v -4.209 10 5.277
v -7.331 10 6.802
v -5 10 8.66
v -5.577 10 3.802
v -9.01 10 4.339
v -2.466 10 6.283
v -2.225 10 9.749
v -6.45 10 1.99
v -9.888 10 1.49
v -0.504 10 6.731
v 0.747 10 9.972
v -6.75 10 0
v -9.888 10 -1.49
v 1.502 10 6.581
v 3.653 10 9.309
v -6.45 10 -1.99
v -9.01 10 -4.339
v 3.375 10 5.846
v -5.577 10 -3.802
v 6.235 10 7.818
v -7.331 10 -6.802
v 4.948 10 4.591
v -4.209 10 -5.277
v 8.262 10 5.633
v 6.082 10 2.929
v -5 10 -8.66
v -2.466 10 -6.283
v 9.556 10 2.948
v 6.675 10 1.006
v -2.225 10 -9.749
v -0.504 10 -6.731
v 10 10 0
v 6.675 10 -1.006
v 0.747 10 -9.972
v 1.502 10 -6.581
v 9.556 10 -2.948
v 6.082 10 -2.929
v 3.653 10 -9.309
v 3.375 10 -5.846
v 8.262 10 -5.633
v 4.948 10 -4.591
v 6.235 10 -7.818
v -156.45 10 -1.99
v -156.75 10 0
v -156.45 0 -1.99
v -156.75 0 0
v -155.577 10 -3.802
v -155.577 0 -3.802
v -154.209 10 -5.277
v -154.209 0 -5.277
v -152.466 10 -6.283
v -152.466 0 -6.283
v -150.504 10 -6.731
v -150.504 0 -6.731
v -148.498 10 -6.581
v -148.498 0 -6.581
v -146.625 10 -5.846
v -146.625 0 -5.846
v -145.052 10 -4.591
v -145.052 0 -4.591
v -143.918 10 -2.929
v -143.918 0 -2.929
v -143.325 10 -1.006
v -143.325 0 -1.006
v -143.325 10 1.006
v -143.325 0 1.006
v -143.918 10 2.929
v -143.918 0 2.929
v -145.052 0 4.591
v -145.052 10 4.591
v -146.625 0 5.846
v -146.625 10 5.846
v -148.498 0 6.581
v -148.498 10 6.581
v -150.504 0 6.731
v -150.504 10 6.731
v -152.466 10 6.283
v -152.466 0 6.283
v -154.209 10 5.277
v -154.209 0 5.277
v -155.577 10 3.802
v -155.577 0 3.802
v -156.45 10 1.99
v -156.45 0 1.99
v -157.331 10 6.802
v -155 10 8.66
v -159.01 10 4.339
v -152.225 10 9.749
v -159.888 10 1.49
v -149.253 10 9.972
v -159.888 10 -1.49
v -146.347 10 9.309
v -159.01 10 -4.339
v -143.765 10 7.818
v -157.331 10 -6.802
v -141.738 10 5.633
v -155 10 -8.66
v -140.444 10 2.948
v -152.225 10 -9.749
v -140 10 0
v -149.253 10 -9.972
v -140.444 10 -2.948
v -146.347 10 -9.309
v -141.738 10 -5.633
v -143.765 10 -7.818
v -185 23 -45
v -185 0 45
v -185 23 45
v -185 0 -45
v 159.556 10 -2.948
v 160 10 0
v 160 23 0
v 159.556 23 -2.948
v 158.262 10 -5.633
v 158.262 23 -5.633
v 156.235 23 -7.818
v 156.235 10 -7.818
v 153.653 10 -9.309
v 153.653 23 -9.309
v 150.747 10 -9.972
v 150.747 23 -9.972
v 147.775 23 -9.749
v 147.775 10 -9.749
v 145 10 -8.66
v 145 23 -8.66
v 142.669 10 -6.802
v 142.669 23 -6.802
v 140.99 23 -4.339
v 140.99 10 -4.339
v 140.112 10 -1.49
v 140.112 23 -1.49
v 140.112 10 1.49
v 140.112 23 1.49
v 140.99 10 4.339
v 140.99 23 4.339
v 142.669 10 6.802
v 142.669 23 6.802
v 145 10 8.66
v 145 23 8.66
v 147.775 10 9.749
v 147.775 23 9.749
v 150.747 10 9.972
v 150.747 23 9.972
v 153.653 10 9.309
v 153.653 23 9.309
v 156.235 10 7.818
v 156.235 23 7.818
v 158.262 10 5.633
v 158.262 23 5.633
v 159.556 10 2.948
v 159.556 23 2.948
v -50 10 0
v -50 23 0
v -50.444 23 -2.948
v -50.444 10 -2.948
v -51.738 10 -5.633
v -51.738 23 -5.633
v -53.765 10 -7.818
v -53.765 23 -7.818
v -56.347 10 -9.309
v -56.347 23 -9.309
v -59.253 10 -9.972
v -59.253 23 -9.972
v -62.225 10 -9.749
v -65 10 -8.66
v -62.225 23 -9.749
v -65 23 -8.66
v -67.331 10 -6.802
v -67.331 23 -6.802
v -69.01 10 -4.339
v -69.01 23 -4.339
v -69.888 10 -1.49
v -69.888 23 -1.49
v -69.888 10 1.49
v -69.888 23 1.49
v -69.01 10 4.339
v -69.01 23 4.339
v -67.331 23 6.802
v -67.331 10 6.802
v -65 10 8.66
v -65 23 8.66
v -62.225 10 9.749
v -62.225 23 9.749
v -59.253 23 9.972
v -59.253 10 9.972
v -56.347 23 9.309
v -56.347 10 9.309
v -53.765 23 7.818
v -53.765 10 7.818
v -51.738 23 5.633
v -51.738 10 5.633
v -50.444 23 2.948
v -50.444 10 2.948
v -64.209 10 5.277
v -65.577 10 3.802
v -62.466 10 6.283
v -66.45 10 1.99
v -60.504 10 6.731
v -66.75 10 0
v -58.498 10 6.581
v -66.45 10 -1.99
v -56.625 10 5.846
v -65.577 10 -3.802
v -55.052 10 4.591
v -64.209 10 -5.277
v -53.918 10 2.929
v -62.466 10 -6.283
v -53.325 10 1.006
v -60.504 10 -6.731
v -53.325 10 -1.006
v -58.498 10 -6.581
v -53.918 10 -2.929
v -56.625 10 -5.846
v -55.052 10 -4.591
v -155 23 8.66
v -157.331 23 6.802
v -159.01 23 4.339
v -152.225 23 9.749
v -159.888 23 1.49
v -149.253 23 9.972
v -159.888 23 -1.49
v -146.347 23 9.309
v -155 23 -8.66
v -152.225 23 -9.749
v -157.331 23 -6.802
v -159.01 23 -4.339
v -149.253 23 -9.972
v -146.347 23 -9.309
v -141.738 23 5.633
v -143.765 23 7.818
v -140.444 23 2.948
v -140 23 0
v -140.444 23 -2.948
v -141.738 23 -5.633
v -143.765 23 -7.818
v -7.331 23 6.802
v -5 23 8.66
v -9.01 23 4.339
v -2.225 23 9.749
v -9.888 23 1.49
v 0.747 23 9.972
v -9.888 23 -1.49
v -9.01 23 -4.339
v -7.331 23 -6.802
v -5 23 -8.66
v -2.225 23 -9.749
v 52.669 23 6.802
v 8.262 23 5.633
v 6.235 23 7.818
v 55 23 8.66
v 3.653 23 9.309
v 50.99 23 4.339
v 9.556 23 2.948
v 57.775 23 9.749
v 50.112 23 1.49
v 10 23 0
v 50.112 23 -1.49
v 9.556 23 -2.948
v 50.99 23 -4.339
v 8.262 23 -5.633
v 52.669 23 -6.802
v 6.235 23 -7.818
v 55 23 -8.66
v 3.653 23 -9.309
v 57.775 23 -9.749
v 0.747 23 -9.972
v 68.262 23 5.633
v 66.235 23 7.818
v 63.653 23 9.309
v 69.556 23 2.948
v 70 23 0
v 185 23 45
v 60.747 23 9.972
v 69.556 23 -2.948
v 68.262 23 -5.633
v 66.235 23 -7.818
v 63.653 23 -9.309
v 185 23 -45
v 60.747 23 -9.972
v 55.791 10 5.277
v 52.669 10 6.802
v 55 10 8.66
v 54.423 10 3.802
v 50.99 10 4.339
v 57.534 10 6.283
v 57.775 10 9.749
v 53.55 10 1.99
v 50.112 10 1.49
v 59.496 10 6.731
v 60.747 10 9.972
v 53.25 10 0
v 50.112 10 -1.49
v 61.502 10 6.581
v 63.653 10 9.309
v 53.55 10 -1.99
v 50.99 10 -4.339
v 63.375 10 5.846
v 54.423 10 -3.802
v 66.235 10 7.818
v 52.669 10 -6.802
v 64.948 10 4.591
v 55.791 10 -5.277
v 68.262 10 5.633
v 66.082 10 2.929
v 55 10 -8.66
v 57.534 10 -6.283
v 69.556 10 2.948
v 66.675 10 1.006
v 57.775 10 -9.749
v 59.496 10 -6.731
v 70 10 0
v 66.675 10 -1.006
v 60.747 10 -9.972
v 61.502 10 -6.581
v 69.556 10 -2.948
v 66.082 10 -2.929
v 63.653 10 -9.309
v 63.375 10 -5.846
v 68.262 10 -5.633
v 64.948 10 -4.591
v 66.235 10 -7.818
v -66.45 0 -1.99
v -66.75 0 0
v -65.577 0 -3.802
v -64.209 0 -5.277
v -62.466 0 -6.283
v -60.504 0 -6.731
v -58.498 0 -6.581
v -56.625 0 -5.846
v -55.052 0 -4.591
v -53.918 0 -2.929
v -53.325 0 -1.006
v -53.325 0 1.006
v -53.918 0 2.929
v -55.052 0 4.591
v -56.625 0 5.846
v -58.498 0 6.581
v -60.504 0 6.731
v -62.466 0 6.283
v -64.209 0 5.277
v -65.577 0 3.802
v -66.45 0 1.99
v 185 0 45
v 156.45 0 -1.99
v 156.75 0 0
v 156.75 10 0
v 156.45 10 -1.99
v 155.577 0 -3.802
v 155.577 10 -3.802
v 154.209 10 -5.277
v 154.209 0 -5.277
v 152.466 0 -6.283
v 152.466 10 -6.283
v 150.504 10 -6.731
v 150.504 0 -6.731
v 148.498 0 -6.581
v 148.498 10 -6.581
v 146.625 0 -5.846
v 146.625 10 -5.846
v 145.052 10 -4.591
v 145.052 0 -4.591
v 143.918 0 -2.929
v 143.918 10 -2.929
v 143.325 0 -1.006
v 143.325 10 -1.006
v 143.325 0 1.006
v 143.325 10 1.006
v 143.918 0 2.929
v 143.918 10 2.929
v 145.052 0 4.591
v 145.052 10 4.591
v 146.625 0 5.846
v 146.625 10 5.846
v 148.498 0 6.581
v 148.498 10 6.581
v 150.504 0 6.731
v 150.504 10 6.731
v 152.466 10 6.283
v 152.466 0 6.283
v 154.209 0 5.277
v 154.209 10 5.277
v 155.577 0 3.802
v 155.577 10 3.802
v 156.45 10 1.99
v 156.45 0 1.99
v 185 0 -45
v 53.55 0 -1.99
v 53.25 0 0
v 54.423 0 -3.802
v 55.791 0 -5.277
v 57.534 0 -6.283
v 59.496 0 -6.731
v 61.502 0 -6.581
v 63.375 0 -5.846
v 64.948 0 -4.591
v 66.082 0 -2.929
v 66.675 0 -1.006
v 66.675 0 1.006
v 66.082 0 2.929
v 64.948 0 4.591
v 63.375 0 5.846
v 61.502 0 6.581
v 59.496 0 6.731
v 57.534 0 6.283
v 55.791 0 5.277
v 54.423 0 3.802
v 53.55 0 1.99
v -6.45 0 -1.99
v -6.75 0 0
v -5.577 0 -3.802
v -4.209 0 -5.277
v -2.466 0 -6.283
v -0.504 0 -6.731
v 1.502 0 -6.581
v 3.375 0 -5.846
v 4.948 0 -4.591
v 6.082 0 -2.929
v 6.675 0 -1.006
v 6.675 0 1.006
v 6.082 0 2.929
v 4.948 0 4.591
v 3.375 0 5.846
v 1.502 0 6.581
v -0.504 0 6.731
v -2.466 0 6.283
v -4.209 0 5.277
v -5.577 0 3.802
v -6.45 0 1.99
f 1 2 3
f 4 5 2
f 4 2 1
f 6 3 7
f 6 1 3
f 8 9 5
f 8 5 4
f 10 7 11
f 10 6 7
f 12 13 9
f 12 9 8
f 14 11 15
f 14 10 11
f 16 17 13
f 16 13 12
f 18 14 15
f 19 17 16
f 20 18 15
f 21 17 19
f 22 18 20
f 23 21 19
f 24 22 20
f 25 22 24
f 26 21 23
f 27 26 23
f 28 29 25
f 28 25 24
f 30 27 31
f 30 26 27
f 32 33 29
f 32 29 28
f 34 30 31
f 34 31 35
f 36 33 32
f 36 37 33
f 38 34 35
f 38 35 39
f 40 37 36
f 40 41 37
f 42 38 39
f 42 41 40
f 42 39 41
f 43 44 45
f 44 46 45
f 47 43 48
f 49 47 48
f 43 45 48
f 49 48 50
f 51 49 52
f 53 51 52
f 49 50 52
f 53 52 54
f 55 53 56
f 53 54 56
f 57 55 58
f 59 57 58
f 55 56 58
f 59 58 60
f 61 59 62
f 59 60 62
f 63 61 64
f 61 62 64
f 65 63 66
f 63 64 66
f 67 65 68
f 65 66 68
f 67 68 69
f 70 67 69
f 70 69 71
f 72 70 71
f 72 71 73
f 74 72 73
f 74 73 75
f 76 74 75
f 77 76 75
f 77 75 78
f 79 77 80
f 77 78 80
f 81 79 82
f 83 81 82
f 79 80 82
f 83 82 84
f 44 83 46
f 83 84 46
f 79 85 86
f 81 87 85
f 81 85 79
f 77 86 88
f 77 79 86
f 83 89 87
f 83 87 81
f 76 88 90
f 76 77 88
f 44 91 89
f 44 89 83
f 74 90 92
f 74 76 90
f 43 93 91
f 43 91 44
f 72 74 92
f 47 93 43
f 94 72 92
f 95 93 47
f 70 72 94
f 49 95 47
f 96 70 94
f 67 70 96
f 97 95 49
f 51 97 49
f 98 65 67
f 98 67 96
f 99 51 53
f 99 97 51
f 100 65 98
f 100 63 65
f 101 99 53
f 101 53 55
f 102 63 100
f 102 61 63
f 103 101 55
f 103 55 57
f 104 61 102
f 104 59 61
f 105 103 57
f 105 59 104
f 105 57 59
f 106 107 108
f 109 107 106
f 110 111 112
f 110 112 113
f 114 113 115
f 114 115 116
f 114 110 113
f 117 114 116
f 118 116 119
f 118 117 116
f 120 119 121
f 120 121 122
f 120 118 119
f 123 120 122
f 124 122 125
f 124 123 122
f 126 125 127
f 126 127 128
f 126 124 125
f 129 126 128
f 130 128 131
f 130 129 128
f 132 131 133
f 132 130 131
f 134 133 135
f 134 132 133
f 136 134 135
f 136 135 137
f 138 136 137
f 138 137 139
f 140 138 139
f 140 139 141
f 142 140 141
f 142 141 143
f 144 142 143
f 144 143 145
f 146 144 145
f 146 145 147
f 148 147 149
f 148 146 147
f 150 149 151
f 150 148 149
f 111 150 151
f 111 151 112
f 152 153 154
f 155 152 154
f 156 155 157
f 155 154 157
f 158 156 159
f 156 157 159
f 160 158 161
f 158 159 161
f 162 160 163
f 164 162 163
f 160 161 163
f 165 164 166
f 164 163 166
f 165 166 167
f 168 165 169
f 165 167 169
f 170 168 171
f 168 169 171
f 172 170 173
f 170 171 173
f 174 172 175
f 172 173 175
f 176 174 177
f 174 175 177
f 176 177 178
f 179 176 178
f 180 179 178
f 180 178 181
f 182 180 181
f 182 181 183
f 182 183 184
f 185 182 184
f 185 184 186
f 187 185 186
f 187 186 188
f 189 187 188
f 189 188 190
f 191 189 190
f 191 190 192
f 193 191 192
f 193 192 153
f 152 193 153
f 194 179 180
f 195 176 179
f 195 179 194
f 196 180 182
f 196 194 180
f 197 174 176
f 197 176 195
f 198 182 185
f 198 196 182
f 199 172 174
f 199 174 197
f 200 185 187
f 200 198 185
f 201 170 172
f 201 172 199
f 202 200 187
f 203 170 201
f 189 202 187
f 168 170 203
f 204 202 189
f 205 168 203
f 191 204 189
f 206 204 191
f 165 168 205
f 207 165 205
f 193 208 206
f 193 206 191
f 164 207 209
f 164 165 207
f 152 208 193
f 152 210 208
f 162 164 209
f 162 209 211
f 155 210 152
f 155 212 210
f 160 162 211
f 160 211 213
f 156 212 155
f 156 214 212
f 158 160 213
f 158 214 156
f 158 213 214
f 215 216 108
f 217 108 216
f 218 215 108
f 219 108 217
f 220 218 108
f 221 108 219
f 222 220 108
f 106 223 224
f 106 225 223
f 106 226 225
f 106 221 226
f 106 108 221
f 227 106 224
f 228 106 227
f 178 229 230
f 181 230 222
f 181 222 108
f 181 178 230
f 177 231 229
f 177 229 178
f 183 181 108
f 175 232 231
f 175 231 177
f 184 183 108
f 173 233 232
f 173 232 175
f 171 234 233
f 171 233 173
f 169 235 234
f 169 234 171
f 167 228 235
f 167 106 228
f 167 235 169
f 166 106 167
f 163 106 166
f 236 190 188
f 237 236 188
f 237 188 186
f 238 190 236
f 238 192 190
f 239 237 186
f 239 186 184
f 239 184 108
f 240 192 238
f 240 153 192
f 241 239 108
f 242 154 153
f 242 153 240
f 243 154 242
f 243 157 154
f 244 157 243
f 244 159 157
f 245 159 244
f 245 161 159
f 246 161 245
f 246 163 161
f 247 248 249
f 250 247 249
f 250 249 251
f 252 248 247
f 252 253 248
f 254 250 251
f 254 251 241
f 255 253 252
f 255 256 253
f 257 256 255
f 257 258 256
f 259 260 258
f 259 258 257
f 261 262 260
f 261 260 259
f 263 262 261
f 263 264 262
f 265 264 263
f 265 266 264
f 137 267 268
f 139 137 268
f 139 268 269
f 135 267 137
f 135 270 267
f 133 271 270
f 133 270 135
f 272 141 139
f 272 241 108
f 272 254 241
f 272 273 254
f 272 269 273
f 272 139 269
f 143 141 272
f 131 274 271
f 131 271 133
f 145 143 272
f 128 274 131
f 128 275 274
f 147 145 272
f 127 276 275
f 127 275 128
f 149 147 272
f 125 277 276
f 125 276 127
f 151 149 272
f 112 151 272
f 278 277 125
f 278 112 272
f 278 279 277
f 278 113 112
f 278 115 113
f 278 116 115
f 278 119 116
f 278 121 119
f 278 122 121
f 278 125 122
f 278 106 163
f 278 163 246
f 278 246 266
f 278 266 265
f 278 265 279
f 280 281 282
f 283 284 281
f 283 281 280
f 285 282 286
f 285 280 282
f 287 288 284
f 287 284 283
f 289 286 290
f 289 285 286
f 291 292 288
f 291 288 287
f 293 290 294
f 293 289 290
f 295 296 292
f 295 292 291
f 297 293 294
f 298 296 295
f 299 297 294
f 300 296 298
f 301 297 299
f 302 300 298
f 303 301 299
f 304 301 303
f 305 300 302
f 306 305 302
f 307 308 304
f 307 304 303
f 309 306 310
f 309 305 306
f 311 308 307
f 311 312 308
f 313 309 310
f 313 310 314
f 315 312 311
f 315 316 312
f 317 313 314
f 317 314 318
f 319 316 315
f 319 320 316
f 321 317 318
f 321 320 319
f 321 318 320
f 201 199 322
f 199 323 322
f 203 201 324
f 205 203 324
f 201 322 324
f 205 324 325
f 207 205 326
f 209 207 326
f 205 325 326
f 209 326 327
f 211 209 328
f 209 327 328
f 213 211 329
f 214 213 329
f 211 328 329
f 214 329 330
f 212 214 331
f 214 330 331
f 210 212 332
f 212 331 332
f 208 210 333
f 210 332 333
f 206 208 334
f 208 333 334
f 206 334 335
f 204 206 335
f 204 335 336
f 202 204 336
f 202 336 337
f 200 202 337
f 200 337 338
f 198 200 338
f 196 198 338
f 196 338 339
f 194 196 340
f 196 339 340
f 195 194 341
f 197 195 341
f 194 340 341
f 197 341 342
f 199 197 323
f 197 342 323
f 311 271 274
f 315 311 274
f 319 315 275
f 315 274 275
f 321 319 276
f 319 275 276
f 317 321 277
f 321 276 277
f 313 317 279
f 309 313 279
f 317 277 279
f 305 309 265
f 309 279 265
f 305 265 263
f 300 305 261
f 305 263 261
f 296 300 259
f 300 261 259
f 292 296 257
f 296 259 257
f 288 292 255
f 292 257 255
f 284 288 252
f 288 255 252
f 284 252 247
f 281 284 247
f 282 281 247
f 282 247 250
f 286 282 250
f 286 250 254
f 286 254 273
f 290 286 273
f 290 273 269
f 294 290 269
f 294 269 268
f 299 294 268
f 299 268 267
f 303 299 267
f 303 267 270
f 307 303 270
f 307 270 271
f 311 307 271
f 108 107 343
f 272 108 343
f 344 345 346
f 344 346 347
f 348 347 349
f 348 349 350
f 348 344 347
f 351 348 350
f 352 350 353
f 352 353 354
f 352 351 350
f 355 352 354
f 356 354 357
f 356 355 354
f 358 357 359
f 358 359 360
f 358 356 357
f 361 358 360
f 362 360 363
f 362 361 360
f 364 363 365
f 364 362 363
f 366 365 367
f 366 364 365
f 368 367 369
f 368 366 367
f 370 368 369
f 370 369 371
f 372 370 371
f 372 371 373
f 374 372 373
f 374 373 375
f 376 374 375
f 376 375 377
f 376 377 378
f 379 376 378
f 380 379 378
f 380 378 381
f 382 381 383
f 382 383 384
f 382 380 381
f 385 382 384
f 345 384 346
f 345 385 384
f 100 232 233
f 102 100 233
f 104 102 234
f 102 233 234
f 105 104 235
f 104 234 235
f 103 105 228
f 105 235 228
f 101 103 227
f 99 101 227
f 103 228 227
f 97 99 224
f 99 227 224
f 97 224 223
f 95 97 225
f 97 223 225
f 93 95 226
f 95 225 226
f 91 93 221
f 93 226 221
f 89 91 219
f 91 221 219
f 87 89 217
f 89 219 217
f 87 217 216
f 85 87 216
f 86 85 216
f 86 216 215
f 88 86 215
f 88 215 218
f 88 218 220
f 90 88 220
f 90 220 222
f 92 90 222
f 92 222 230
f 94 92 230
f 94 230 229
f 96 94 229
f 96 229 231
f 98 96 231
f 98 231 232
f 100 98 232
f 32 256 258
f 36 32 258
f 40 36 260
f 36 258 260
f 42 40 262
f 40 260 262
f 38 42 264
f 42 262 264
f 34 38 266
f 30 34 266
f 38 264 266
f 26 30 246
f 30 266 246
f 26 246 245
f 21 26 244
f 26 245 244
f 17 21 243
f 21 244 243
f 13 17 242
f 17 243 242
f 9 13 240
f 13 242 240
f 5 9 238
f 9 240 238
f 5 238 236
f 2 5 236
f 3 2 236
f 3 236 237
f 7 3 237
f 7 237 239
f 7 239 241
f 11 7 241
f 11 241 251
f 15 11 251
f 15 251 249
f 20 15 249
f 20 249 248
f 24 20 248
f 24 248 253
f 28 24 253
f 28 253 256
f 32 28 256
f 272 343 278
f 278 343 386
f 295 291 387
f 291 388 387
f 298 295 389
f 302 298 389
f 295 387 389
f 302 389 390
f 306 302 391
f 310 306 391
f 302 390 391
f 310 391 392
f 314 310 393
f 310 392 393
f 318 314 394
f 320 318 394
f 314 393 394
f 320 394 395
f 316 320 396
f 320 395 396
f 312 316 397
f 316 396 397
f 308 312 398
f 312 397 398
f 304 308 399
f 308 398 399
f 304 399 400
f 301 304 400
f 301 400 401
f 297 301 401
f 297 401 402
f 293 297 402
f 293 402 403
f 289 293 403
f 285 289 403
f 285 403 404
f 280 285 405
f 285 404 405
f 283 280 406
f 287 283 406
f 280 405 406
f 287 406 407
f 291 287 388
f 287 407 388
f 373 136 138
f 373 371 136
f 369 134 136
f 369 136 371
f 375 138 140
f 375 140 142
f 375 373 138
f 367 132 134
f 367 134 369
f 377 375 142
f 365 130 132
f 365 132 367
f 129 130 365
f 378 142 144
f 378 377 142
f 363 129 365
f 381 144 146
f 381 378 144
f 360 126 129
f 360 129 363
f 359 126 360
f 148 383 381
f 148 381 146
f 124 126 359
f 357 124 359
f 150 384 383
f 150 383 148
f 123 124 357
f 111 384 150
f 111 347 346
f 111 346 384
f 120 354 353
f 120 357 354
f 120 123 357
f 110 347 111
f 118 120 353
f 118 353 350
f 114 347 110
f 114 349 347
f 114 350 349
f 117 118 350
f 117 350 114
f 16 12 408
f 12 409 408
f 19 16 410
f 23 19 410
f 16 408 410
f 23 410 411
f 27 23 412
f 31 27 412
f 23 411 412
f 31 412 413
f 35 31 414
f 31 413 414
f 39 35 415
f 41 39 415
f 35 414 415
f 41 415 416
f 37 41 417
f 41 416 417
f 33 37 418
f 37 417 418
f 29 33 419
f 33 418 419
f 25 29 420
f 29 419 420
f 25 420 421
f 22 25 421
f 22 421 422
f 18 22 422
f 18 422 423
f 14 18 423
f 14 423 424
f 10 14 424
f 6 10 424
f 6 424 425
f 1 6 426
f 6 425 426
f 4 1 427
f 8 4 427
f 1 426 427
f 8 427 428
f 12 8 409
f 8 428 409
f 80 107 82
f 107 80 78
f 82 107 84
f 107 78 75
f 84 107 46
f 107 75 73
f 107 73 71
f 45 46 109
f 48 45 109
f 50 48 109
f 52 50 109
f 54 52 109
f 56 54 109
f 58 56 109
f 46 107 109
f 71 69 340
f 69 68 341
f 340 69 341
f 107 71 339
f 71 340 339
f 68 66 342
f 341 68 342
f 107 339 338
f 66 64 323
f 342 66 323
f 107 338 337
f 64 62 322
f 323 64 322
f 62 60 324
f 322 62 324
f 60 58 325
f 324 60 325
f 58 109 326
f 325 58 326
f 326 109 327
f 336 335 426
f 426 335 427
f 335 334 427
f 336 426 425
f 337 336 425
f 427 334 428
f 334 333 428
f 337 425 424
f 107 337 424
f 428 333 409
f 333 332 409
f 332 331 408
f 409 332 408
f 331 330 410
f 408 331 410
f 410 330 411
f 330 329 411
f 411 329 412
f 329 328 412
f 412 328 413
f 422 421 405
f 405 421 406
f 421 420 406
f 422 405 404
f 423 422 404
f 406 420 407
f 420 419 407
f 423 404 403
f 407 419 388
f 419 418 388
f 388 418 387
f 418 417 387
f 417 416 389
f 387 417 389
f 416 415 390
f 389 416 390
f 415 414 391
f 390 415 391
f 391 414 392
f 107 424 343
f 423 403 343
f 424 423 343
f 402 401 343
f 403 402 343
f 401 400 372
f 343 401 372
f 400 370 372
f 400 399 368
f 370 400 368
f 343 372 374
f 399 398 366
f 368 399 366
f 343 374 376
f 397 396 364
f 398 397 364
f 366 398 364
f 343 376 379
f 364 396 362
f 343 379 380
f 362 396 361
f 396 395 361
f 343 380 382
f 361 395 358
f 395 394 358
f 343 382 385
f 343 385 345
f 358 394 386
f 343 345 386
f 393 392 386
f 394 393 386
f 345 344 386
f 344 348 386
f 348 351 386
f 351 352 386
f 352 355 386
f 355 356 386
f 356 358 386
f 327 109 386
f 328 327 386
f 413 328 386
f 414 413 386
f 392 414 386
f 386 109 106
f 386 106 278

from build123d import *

# Parameters (mm, degrees)
SKETCH_1_W                          = 370
SKETCH_1_H                          = 90
EXTRUDE_1_DEPTH                     = 23
HOLE_WIZARD_M4_1_D                  = 13.5
HOLE_WIZARD_M4_1_CBORE_D            = 20
HOLE_WIZARD_M4_1_CBORE_DEPTH        = 13
PATTERN_LINEAR_1_COUNT              = 2
PATTERN_LINEAR_1_PITCH              = 90
PATTERN_LINEAR_2_COPY_1_D           = 13.5
PATTERN_LINEAR_2_COPY_1_CBORE_D     = 20
PATTERN_LINEAR_2_COPY_1_CBORE_DEPTH = 13
PATTERN_LINEAR_2_COPY_2_D           = 13.5
PATTERN_LINEAR_2_COPY_2_CBORE_D     = 20
PATTERN_LINEAR_2_COPY_2_CBORE_DEPTH = 13
PATTERN_START                       = 10
PATTERN_LINEAR_3_OUTLINE_R          = 10
PATTERN_LINEAR_3_DEPTH              = 13
PATTERN_LINEAR_3_2_OUTLINE_R        = 6.75
PATTERN_LINEAR_3_2_DEPTH            = 10


# Read off the part's stored shape, not the designer's step: 阵列(线性)3
with BuildPart() as part:
    # 草图1 → 凸台-拉伸1 (new body)
    with BuildSketch(Plane(origin=(0, 0, 0), x_dir=(1, 0, 0), z_dir=(0, 1, 0))):
        Rectangle(SKETCH_1_W, SKETCH_1_H)
    extrude(amount=EXTRUDE_1_DEPTH)

    # M4 六角头螺栓的柱形沉头孔1 (through all)
    with Locations(Plane(origin=(0, 23, 0), x_dir=(1, 0, 0), z_dir=(0, 1, 0))):
        with Locations((-150, 0)):
            hole_wizard_m4_1 = CounterBoreHole(HOLE_WIZARD_M4_1_D / 2, HOLE_WIZARD_M4_1_CBORE_D / 2, HOLE_WIZARD_M4_1_CBORE_DEPTH)

    # 阵列(线性)1: M4 六角头螺栓的柱形沉头孔1 ×2
    with Locations(*[(i * PATTERN_LINEAR_1_PITCH, 0, 0) for i in range(1, PATTERN_LINEAR_1_COUNT)]):
        add(hole_wizard_m4_1, mode=Mode.SUBTRACT)

    # 阵列(线性)2 copy 1 (through all)
    with Locations(Plane(origin=(150, 23, 0), x_dir=(1, 0, 0), z_dir=(0, 1, 0))):
        with Locations((-150, 0)):
            CounterBoreHole(PATTERN_LINEAR_2_COPY_1_D / 2, PATTERN_LINEAR_2_COPY_1_CBORE_D / 2, PATTERN_LINEAR_2_COPY_1_CBORE_DEPTH)

    # 阵列(线性)2 copy 2 (through all)
    with Locations(Plane(origin=(210, 23, 0), x_dir=(1, 0, 0), z_dir=(0, 1, 0))):
        with Locations((-150, 0)):
            CounterBoreHole(PATTERN_LINEAR_2_COPY_2_D / 2, PATTERN_LINEAR_2_COPY_2_CBORE_D / 2, PATTERN_LINEAR_2_COPY_2_CBORE_DEPTH)

    # 阵列(线性)3 outline → 阵列(线性)3 (cut)
    with BuildSketch(Plane(origin=(0, 0, 0), x_dir=(1, 0, 0), z_dir=(0, 1, 0)).offset(PATTERN_START)):
        with Locations((150, 0)):
            Circle(PATTERN_LINEAR_3_OUTLINE_R)
    extrude(amount=PATTERN_LINEAR_3_DEPTH, mode=Mode.SUBTRACT)

    # Pattern Linear 3 2 outline → Pattern Linear 3 2 (cut)
    with BuildSketch(Plane(origin=(0, 0, 0), x_dir=(1, 0, 0), z_dir=(0, 1, 0))):
        with Locations((150, 0)):
            Circle(PATTERN_LINEAR_3_2_OUTLINE_R)
    extrude(amount=PATTERN_LINEAR_3_2_DEPTH, mode=Mode.SUBTRACT)


solid = part.part
